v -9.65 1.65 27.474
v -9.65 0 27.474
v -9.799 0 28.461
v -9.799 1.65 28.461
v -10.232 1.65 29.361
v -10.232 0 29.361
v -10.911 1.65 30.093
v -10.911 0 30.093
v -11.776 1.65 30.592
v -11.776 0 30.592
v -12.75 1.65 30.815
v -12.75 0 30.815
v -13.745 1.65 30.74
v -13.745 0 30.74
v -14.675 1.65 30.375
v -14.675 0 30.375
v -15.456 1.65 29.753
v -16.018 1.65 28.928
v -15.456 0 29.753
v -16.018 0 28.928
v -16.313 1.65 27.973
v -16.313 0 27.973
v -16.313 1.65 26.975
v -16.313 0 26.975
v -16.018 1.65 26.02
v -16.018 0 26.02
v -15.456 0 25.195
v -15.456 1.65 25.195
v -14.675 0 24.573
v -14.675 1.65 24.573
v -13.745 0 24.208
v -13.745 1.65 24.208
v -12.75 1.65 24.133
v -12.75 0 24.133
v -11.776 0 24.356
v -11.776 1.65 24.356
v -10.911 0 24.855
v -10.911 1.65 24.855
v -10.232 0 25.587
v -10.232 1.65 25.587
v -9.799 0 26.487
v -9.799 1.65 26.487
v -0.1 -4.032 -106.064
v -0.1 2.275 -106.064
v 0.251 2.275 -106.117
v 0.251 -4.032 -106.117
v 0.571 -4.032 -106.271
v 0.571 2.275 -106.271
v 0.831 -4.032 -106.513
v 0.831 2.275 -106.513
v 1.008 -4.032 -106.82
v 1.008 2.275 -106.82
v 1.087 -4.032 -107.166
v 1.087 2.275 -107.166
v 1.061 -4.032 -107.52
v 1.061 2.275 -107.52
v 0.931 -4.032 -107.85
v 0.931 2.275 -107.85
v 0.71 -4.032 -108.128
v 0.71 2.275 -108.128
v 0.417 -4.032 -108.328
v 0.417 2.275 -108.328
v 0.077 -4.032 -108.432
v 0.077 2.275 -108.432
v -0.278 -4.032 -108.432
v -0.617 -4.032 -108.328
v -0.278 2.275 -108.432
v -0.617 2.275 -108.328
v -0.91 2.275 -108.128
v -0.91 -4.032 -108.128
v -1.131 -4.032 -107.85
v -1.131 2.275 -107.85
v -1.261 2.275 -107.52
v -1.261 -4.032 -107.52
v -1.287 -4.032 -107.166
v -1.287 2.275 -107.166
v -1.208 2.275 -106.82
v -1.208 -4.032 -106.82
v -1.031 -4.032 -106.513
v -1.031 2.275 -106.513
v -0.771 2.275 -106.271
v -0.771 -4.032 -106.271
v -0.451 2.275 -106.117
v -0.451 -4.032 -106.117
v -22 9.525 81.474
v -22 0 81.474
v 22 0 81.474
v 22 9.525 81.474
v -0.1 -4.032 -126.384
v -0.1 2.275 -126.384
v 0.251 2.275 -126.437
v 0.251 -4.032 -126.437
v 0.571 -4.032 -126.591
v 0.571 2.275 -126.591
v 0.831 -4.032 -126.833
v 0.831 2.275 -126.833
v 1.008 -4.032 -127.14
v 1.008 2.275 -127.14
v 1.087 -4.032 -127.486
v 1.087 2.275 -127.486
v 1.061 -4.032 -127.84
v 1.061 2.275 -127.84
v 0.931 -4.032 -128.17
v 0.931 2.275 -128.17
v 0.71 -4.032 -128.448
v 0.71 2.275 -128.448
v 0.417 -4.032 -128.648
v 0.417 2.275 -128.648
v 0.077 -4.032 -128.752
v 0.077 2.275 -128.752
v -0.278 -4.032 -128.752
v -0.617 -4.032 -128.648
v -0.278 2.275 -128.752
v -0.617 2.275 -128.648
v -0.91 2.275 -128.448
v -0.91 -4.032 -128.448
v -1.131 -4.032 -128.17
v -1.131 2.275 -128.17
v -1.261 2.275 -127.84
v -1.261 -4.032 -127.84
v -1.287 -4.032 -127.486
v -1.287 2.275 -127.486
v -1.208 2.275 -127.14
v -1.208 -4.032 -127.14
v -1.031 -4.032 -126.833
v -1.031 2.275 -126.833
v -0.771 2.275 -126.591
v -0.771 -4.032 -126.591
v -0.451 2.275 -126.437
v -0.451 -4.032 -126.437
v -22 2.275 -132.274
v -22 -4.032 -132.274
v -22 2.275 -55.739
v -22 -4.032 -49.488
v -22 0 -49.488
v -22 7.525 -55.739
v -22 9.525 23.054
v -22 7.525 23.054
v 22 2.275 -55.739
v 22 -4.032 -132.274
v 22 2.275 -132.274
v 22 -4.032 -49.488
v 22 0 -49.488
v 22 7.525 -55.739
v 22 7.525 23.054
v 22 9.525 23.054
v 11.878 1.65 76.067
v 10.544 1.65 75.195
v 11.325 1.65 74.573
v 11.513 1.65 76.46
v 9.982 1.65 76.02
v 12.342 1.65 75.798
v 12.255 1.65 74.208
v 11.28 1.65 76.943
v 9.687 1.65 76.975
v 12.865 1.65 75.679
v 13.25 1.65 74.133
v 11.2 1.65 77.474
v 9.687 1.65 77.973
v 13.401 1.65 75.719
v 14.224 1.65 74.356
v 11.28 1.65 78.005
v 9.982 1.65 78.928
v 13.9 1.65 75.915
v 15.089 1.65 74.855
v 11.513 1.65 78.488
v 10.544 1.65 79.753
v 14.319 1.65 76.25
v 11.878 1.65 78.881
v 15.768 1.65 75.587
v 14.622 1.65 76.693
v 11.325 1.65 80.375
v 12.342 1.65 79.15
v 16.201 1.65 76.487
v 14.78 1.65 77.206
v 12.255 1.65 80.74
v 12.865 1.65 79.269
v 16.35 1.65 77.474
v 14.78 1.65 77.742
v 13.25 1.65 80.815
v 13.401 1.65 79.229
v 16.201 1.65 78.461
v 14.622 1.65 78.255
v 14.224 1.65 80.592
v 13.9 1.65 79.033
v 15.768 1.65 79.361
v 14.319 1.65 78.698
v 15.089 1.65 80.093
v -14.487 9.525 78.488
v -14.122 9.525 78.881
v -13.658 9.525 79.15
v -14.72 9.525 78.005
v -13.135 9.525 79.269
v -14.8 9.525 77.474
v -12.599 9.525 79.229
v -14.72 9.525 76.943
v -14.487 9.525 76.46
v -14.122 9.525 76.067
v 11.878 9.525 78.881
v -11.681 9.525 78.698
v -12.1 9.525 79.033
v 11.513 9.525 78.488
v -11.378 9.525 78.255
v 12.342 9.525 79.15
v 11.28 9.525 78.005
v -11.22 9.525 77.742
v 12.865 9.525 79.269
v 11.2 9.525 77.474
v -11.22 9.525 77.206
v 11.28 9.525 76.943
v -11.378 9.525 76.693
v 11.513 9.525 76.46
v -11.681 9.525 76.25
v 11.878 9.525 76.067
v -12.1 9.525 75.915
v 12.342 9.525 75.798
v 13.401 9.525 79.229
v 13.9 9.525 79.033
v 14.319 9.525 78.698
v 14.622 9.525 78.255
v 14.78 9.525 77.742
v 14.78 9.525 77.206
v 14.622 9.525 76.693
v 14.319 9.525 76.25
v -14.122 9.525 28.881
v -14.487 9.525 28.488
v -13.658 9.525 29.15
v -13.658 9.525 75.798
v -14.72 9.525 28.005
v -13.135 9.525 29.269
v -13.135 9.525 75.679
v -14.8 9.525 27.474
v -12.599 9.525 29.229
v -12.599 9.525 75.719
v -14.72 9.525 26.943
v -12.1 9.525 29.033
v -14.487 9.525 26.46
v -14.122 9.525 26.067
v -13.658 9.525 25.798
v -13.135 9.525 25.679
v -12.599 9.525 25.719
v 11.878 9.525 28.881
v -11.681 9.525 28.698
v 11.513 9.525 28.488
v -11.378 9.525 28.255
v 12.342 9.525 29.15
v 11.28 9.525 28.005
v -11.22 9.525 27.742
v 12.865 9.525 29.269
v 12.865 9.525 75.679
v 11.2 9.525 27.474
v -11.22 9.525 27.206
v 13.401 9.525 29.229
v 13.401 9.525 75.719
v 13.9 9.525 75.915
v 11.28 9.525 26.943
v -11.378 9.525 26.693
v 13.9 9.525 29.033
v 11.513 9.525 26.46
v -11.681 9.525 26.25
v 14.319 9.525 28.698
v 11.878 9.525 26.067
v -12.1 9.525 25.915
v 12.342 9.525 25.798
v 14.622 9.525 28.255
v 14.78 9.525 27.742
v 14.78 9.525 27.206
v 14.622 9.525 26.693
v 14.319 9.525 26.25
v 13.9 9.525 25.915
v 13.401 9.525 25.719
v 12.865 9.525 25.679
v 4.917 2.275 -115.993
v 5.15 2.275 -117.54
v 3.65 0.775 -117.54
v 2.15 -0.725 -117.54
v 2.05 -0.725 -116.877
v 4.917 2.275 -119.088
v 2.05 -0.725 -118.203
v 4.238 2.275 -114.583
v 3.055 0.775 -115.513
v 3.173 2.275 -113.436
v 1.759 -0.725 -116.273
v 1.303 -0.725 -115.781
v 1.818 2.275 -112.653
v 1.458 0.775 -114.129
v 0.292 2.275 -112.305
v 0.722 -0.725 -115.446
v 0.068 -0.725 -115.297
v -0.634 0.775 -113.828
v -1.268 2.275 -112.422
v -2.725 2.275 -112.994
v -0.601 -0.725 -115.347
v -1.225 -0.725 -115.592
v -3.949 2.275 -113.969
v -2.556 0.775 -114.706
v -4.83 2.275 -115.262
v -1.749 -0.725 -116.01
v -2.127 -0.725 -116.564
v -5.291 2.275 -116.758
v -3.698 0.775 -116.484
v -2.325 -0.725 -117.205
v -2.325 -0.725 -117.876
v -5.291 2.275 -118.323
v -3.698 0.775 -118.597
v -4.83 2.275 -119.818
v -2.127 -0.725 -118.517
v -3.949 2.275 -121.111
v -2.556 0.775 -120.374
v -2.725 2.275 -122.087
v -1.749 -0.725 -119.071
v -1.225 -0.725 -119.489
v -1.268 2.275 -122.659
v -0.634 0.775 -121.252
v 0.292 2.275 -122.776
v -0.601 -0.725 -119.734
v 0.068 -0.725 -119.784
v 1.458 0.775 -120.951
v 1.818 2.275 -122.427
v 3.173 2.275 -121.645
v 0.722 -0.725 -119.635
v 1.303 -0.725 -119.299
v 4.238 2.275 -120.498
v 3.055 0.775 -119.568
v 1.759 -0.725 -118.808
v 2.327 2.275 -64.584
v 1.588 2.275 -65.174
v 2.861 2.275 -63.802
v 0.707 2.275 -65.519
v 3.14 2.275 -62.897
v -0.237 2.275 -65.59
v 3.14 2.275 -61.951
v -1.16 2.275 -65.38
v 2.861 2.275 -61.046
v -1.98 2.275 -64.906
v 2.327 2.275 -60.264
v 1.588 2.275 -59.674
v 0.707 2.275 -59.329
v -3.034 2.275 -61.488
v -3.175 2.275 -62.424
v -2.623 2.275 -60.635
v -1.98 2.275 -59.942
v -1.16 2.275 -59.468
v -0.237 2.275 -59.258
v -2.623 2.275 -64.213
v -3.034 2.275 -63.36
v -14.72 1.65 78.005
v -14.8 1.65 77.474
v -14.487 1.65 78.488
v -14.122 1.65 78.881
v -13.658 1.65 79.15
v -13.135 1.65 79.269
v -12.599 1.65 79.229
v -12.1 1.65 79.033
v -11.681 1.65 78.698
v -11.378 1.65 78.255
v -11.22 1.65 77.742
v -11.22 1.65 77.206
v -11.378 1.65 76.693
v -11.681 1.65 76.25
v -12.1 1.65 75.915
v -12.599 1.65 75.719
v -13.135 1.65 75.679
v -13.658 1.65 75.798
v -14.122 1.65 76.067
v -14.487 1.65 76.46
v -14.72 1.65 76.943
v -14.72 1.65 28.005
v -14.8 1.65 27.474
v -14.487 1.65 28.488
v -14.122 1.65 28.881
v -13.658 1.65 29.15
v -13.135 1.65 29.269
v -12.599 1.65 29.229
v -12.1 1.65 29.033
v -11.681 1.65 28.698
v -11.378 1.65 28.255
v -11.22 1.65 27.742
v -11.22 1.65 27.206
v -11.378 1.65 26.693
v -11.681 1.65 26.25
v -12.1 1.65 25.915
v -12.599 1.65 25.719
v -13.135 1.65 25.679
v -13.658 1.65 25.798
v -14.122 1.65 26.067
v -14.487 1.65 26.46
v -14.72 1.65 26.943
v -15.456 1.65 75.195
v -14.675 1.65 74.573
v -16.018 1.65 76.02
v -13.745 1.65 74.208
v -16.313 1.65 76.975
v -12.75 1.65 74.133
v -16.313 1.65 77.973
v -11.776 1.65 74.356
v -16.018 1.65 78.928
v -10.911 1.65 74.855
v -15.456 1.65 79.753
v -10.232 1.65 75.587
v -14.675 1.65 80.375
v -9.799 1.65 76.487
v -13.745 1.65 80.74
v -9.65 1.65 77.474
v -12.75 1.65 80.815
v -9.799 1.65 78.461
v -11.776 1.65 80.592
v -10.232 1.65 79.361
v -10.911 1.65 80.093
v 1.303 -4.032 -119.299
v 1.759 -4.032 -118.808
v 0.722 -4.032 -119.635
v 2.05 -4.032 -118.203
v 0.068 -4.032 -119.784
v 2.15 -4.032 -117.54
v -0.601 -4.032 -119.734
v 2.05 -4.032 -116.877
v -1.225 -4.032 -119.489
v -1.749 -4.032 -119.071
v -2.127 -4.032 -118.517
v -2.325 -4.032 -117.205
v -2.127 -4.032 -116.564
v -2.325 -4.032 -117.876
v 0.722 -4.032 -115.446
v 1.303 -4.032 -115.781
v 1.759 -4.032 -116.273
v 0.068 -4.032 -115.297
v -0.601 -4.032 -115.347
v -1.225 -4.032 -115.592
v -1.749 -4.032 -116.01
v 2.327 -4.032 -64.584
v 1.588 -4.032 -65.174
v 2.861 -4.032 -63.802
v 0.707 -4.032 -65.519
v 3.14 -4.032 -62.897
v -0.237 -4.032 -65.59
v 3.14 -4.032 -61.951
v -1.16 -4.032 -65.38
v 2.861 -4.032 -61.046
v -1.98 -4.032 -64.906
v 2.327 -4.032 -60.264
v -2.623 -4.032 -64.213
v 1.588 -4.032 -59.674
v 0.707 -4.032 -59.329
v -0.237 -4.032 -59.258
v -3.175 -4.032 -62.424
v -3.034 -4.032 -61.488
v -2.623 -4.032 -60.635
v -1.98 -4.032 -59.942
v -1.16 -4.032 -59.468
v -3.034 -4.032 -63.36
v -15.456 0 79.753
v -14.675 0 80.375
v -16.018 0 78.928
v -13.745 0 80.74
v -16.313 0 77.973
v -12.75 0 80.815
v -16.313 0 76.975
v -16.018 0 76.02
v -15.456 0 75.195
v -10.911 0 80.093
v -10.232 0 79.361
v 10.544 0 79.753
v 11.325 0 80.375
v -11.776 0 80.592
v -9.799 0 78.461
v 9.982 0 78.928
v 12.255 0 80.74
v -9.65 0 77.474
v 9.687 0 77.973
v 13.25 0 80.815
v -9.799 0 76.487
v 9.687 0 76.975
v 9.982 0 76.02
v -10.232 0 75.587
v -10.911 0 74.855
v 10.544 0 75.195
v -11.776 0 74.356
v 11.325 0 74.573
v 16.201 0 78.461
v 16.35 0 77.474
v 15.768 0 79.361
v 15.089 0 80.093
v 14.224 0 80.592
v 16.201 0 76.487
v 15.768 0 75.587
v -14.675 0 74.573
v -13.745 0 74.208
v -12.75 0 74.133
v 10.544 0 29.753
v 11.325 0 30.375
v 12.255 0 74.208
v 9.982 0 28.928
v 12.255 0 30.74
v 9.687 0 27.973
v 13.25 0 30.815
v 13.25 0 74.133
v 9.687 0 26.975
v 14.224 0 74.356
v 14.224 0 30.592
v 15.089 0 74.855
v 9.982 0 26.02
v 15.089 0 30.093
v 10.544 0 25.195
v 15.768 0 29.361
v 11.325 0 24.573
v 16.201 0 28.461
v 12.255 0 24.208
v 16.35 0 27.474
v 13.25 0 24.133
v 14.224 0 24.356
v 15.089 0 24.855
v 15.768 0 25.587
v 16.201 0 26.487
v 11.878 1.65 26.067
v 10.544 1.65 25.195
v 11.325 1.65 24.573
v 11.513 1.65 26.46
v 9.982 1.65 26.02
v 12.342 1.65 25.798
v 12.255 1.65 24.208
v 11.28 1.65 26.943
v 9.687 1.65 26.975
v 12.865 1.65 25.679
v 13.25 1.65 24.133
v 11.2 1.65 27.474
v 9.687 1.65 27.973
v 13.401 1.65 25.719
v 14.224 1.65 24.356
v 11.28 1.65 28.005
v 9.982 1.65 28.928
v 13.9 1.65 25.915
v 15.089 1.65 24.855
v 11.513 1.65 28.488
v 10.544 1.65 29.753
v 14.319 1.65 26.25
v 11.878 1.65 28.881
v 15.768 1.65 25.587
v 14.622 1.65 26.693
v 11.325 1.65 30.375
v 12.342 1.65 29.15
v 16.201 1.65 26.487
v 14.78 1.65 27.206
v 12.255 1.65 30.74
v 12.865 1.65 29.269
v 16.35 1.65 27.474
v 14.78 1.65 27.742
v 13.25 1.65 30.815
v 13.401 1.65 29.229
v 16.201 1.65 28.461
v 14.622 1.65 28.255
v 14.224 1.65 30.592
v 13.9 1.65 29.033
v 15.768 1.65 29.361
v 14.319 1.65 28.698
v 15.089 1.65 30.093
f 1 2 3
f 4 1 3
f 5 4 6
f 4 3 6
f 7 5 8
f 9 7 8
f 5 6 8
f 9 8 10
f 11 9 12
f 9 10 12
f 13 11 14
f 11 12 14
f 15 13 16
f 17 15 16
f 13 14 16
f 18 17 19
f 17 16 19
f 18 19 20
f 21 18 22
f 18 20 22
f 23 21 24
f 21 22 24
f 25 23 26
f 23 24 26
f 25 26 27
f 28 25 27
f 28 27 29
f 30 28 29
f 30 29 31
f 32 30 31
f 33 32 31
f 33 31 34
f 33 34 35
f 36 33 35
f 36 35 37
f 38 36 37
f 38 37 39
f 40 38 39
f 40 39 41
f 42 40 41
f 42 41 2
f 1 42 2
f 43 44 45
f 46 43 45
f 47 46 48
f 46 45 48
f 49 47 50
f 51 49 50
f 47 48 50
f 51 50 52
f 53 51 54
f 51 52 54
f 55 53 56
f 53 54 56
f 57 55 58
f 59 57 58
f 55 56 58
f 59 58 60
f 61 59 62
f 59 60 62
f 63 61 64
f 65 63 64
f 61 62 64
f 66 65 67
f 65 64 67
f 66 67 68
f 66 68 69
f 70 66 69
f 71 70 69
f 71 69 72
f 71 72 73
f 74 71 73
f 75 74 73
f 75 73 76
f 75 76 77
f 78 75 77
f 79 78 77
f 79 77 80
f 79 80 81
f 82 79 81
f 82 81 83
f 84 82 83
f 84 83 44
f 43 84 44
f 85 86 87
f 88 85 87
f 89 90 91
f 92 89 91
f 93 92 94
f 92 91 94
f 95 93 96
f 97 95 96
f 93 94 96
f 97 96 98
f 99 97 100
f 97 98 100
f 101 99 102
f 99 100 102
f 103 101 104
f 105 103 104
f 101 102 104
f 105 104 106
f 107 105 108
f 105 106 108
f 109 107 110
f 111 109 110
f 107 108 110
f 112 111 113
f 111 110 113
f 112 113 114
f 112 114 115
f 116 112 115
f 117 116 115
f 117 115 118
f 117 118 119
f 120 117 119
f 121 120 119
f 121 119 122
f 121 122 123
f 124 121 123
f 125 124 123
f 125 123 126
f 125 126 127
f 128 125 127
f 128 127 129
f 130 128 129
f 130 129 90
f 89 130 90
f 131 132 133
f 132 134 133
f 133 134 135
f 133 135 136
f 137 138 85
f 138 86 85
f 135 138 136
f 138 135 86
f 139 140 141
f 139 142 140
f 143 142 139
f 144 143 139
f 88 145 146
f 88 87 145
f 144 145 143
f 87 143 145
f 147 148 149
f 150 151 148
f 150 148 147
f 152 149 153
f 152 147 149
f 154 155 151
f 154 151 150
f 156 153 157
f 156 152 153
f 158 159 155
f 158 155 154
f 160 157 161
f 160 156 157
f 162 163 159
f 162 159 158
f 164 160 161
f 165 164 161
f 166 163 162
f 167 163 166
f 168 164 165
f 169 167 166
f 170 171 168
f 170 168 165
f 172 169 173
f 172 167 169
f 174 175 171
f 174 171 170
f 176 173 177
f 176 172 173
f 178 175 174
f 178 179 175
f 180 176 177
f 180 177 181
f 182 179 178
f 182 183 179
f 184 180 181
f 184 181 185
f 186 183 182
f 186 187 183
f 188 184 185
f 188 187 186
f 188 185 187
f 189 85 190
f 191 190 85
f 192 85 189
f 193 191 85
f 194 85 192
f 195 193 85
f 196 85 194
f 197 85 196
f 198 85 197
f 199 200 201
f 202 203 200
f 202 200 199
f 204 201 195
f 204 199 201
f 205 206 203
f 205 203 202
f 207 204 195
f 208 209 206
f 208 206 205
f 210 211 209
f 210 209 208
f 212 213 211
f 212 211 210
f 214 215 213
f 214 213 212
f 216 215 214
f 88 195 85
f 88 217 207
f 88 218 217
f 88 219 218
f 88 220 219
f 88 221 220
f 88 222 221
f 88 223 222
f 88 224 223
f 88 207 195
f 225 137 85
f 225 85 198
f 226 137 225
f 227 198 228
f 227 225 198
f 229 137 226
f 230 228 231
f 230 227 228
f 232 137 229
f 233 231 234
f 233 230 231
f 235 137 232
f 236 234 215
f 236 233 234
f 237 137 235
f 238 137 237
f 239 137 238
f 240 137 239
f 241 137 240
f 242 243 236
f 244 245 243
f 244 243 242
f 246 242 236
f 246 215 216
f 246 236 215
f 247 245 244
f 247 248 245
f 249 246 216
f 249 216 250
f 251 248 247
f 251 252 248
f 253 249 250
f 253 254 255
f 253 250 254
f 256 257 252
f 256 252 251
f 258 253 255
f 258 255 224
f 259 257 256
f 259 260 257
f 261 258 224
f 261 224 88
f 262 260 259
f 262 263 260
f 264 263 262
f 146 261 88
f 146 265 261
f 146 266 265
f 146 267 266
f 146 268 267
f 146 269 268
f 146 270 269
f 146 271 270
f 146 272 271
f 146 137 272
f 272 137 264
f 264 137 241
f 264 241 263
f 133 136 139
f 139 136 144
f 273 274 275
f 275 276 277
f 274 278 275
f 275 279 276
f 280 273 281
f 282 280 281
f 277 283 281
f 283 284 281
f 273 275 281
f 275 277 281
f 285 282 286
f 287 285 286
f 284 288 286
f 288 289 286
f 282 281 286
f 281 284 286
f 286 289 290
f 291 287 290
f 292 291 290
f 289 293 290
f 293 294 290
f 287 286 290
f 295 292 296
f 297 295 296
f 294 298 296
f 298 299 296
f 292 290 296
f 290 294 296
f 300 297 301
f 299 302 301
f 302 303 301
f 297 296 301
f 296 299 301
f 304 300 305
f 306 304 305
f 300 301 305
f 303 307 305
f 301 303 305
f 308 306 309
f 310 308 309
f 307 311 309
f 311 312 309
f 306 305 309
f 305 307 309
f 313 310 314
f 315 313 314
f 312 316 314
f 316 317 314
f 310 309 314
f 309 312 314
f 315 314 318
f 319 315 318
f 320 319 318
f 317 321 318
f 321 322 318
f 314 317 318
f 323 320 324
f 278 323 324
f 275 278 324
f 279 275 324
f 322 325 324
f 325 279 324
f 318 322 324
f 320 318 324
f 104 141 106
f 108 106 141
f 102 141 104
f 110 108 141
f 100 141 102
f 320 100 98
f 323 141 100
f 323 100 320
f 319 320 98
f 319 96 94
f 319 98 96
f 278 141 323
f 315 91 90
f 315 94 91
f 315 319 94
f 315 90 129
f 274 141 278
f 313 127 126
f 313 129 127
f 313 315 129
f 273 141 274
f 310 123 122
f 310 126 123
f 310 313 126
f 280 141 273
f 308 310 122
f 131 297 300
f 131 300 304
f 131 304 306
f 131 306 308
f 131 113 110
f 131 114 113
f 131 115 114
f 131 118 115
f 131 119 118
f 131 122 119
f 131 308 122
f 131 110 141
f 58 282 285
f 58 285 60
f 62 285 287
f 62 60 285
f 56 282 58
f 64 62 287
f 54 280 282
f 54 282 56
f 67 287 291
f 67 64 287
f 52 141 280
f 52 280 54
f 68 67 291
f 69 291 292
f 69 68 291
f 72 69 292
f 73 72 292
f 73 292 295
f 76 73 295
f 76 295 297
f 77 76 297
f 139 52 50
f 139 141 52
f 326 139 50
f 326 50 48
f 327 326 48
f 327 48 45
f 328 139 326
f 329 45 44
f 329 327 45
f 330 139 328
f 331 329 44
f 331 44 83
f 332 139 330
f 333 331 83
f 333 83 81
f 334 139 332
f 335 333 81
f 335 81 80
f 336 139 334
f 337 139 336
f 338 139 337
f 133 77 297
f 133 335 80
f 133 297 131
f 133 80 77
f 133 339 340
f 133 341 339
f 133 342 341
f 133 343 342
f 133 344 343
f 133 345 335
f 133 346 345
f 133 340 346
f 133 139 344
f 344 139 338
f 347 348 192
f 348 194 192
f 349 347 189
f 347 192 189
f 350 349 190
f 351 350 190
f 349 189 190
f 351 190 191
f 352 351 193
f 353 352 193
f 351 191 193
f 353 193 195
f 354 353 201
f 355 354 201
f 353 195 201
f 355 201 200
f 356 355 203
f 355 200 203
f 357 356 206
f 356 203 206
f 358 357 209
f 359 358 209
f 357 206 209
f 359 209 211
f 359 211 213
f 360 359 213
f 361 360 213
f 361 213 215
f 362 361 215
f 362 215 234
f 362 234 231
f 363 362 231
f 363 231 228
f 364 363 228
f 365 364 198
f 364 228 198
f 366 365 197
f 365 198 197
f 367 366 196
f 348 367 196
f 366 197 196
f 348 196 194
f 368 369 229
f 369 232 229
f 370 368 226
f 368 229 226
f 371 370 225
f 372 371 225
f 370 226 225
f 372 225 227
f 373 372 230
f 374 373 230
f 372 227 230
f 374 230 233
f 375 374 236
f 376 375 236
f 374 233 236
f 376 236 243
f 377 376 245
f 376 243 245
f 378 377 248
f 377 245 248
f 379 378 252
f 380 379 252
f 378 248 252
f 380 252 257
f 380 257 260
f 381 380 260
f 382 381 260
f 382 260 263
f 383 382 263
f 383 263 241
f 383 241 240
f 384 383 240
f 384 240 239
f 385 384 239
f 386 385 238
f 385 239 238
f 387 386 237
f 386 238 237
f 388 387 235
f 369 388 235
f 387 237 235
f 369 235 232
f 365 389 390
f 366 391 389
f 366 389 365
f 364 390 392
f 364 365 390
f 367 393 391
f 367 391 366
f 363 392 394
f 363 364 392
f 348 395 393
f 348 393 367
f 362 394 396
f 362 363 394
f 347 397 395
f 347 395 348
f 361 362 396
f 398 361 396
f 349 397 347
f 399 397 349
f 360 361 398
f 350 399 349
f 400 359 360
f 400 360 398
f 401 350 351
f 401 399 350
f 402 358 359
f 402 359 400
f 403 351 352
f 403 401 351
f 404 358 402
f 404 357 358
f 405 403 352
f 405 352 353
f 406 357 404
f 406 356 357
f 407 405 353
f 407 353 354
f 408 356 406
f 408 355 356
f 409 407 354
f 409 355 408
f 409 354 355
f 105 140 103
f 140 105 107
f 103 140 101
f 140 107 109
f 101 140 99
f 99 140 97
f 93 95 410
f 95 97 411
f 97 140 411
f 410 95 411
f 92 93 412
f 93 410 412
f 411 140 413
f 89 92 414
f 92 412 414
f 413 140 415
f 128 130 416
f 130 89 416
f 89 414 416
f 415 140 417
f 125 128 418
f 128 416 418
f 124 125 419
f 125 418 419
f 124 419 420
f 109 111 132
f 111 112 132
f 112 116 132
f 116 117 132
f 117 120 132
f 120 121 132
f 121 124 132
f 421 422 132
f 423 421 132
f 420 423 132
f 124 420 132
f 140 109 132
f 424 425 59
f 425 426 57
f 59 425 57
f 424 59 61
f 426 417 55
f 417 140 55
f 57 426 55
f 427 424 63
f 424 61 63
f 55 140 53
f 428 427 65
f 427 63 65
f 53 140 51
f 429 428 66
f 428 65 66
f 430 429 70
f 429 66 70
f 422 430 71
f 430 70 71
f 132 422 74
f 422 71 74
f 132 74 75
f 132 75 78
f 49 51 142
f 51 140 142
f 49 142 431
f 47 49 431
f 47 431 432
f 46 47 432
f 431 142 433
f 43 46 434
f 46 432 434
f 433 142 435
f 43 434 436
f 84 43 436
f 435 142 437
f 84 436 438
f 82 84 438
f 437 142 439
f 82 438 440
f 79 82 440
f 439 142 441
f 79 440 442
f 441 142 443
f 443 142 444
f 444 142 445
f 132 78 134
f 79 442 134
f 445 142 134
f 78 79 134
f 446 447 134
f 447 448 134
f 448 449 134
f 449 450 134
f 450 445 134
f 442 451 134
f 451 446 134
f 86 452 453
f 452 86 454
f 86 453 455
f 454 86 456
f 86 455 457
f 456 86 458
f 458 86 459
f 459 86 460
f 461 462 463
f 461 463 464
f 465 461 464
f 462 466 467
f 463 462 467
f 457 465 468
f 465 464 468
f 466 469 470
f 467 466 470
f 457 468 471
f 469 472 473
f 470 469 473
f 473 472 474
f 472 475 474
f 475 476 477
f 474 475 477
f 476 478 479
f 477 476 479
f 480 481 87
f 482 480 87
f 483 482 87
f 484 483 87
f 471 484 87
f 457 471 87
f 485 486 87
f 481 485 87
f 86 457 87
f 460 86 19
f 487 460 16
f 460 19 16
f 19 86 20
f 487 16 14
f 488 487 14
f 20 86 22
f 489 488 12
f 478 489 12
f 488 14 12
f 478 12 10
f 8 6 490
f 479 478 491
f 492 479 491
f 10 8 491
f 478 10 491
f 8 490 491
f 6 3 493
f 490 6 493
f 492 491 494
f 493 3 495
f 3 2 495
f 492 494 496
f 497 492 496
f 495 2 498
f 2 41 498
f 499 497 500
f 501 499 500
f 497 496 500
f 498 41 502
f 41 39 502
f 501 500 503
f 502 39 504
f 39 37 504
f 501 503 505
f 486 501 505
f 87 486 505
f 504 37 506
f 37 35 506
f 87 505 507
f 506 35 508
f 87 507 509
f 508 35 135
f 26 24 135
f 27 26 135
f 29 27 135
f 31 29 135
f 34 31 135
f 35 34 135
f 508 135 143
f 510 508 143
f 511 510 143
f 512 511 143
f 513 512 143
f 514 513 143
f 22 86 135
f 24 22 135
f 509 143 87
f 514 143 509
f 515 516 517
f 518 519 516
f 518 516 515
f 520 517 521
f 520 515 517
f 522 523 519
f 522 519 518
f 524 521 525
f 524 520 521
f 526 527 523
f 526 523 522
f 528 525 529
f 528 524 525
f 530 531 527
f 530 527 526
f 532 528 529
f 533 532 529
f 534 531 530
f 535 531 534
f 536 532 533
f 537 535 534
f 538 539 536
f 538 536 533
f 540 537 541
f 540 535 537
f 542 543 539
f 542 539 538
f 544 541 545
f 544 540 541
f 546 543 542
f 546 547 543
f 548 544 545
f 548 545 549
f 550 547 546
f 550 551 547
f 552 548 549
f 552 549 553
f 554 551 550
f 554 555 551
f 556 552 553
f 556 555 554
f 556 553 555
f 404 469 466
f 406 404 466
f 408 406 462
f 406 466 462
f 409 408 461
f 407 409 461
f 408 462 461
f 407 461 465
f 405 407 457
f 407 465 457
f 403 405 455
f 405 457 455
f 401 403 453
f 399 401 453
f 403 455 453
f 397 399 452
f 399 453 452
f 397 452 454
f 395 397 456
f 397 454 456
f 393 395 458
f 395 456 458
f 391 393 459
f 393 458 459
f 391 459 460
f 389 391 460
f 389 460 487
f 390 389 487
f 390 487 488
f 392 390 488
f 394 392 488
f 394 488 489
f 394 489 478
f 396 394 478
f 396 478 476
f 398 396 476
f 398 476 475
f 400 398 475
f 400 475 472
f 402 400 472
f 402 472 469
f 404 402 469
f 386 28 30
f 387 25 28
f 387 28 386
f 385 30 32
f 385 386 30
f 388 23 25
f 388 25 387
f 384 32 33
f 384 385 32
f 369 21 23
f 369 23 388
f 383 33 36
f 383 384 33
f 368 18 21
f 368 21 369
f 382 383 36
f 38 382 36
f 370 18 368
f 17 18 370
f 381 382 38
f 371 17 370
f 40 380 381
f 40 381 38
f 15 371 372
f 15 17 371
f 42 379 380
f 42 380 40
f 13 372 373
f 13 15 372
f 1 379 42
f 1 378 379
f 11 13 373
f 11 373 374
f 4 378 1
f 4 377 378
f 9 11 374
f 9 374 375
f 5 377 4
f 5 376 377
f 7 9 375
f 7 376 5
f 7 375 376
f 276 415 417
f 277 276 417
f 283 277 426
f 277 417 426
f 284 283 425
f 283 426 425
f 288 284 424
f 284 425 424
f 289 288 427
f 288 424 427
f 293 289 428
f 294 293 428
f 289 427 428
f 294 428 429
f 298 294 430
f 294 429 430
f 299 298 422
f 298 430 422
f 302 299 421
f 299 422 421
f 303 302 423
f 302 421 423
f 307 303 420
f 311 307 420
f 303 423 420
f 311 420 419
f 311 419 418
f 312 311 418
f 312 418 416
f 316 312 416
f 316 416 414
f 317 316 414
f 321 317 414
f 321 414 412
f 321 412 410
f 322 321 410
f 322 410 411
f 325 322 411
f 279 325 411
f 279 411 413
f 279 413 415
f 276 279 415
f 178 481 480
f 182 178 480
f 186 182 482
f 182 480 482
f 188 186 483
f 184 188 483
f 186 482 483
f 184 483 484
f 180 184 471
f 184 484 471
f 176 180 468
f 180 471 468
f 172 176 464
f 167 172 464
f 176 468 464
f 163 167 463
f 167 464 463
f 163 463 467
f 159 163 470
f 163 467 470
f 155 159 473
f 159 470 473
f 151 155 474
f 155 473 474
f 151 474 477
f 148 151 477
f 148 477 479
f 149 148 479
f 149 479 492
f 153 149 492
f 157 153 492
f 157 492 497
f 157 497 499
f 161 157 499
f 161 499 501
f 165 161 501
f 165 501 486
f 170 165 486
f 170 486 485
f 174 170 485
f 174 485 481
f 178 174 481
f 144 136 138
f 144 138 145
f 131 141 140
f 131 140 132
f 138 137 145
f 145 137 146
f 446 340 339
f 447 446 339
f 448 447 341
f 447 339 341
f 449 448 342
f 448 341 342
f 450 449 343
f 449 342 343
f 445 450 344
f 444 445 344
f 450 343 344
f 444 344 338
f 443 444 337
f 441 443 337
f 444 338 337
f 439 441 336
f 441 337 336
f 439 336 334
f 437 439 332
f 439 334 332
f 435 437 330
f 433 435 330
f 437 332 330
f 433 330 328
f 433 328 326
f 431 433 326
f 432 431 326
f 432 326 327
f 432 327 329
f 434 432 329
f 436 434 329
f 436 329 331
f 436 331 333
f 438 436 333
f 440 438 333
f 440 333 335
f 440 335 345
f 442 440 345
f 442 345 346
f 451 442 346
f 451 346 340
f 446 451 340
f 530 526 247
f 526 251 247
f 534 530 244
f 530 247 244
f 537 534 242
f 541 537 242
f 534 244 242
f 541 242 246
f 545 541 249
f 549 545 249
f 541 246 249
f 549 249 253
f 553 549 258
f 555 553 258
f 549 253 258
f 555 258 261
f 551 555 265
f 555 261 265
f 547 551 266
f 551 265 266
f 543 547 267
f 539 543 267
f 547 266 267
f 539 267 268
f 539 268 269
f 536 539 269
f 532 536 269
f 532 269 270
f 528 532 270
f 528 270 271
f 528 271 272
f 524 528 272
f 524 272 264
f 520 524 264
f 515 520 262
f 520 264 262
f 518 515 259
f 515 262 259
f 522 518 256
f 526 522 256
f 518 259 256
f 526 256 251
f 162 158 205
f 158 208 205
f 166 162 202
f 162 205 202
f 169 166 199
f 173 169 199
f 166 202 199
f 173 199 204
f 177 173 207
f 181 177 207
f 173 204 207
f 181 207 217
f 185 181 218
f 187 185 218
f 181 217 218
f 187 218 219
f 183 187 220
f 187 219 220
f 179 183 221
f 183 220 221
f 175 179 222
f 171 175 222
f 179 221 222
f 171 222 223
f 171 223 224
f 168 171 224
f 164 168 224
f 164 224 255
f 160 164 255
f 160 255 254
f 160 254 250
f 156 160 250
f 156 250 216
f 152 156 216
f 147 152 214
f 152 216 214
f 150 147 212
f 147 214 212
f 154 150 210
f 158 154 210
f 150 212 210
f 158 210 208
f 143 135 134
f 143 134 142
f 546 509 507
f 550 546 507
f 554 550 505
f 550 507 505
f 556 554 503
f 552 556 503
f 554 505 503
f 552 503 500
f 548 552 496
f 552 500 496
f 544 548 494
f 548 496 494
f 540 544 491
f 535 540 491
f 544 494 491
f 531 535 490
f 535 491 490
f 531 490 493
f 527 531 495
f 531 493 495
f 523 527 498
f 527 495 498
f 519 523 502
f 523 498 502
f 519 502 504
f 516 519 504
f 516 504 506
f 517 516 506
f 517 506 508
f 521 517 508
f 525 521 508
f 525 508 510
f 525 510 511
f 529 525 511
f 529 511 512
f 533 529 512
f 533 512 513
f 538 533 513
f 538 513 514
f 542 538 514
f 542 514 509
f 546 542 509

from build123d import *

# Parameters (mm, degrees)
SKETCH1_W                       = 44
SKETCH1_H                       = 162.947999986
EXTRUDE1_DEPTH                  = 9.525
SKETCH5_W                       = 44
SKETCH5_H                       = 104.527999986
EXTRUDE3_DEPTH                  = 2
SKETCH7_W                       = 44
SKETCH7_H                       = 25.735194666
EXTRUDE5_DEPTH                  = 5.25
SKETCH6_W                       = 44
SKETCH6_H                       = 31.986263093
EXTRUDE4_DEPTH                  = 4.032
F_1_4_0_25_DIAMETER_HOLE1_D     = 6.35
F_1_4_0_25_DIAMETER_HOLE1_DEPTH = 18.618
SKETCH8_W                       = 44
SKETCH8_H                       = 6.307
EXTRUDE6_DEPTH                  = 50.8
CBORE_FOR_M3_SBHCS1_D           = 3.6
CBORE_FOR_M3_SBHCS1_CBORE_D     = 6.7
CBORE_FOR_M3_SBHCS1_CBORE_DEPTH = 1.65
SKETCH12_R                      = 1.190625
CUT_EXTRUDE1_DEPTH              = 135.28690768
M4_CLEARANCE_HOLE1_D            = 4.5
M4_CLEARANCE_HOLE1_DEPTH        = 8.204
CHAMFER1_SIZE                   = 3


with BuildPart() as part:
    # Sketch1 → Extrude1 (new body)
    with BuildSketch(Plane(origin=(0, 0, 0), x_dir=(1, 0, 0), z_dir=(0, 1, 0))):
        Rectangle(SKETCH1_W, SKETCH1_H)
    extrude(amount=EXTRUDE1_DEPTH)

    # Sketch5 → Extrude3 (cut)
    with BuildSketch(Plane(origin=(0, 9.525, 0), x_dir=(1, 0, 0), z_dir=(0, 1, 0))):
        with Locations((0, 29.21)):
            Rectangle(SKETCH5_W, SKETCH5_H)
    extrude(amount=-EXTRUDE3_DEPTH, mode=Mode.SUBTRACT)

    # Sketch7 → Extrude5 (cut)
    with BuildSketch(Plane(origin=(0, 7.525, 0), x_dir=(1, 0, 0), z_dir=(0, 1, 0))):
        with Locations((0, 68.60640266)):
            Rectangle(SKETCH7_W, SKETCH7_H)
    extrude(amount=-EXTRUDE5_DEPTH, mode=Mode.SUBTRACT)

    # Sketch6 → Extrude4 (add)
    with BuildSketch(Plane.XZ):
        with Locations((0, -65.480868447)):
            Rectangle(SKETCH6_W, SKETCH6_H)
    extrude(amount=EXTRUDE4_DEPTH)

    # 1/4 (0.25) Diameter Hole1
    with Locations(Plane(origin=(-11.909442165, -4.032, 7.994157722), x_dir=(1, 0, 0), z_dir=(0, -1, 0))):
        with Locations((11.909442165, -70.418157729)):
            Hole(F_1_4_0_25_DIAMETER_HOLE1_D / 2, depth=F_1_4_0_25_DIAMETER_HOLE1_DEPTH)

    # Sketch8 → Extrude6 (add)
    with BuildSketch(Plane(origin=(0, 0, -81.473999993), x_dir=(-1, 0, 0), z_dir=(0, 0, -1))):
        with Locations((0, -0.8785)):
            Rectangle(SKETCH8_W, SKETCH8_H)
    extrude(amount=EXTRUDE6_DEPTH)

    # CBORE for M3 SBHCS1 (through all)
    with Locations(Plane.XZ):
        with Locations((-13, 77.473999993), (13, 77.473999993), (13, 27.473999993), (-13, 27.473999993)):
            CounterBoreHole(CBORE_FOR_M3_SBHCS1_D / 2, CBORE_FOR_M3_SBHCS1_CBORE_D / 2, CBORE_FOR_M3_SBHCS1_CBORE_DEPTH)

    # Sketch12 → Cut-Extrude1 (cut, through all)
    with BuildSketch(Plane(origin=(0, 2.275, 0), x_dir=(-1, 0, 0), z_dir=(0, 1, 0))):
        with Locations(Location((0.10007052, -127.574998873, 0), (0, 0, 90))):
            Circle(SKETCH12_R)
        with Locations(Location((0.10007052, -107.254998873, 0), (0, 0, 90))):
            Circle(SKETCH12_R)
    extrude(amount=-CUT_EXTRUDE1_DEPTH, mode=Mode.SUBTRACT)

    # M4 Clearance Hole1
    with Locations(Plane(origin=(0, 2.275, 0), x_dir=(-1, 0, 0), z_dir=(0, 1, 0))):
        with Locations((0.10007052, -117.540271762)):
            Hole(M4_CLEARANCE_HOLE1_D / 2, depth=M4_CLEARANCE_HOLE1_DEPTH)

    # Chamfer1
    chamfer1_edges = [part.edges().sort_by_distance(p)[0] for p in [
        (-2.35007052, 2.275, -117.540271762),
    ]]
    chamfer(chamfer1_edges, length=CHAMFER1_SIZE)


solid = part.part
